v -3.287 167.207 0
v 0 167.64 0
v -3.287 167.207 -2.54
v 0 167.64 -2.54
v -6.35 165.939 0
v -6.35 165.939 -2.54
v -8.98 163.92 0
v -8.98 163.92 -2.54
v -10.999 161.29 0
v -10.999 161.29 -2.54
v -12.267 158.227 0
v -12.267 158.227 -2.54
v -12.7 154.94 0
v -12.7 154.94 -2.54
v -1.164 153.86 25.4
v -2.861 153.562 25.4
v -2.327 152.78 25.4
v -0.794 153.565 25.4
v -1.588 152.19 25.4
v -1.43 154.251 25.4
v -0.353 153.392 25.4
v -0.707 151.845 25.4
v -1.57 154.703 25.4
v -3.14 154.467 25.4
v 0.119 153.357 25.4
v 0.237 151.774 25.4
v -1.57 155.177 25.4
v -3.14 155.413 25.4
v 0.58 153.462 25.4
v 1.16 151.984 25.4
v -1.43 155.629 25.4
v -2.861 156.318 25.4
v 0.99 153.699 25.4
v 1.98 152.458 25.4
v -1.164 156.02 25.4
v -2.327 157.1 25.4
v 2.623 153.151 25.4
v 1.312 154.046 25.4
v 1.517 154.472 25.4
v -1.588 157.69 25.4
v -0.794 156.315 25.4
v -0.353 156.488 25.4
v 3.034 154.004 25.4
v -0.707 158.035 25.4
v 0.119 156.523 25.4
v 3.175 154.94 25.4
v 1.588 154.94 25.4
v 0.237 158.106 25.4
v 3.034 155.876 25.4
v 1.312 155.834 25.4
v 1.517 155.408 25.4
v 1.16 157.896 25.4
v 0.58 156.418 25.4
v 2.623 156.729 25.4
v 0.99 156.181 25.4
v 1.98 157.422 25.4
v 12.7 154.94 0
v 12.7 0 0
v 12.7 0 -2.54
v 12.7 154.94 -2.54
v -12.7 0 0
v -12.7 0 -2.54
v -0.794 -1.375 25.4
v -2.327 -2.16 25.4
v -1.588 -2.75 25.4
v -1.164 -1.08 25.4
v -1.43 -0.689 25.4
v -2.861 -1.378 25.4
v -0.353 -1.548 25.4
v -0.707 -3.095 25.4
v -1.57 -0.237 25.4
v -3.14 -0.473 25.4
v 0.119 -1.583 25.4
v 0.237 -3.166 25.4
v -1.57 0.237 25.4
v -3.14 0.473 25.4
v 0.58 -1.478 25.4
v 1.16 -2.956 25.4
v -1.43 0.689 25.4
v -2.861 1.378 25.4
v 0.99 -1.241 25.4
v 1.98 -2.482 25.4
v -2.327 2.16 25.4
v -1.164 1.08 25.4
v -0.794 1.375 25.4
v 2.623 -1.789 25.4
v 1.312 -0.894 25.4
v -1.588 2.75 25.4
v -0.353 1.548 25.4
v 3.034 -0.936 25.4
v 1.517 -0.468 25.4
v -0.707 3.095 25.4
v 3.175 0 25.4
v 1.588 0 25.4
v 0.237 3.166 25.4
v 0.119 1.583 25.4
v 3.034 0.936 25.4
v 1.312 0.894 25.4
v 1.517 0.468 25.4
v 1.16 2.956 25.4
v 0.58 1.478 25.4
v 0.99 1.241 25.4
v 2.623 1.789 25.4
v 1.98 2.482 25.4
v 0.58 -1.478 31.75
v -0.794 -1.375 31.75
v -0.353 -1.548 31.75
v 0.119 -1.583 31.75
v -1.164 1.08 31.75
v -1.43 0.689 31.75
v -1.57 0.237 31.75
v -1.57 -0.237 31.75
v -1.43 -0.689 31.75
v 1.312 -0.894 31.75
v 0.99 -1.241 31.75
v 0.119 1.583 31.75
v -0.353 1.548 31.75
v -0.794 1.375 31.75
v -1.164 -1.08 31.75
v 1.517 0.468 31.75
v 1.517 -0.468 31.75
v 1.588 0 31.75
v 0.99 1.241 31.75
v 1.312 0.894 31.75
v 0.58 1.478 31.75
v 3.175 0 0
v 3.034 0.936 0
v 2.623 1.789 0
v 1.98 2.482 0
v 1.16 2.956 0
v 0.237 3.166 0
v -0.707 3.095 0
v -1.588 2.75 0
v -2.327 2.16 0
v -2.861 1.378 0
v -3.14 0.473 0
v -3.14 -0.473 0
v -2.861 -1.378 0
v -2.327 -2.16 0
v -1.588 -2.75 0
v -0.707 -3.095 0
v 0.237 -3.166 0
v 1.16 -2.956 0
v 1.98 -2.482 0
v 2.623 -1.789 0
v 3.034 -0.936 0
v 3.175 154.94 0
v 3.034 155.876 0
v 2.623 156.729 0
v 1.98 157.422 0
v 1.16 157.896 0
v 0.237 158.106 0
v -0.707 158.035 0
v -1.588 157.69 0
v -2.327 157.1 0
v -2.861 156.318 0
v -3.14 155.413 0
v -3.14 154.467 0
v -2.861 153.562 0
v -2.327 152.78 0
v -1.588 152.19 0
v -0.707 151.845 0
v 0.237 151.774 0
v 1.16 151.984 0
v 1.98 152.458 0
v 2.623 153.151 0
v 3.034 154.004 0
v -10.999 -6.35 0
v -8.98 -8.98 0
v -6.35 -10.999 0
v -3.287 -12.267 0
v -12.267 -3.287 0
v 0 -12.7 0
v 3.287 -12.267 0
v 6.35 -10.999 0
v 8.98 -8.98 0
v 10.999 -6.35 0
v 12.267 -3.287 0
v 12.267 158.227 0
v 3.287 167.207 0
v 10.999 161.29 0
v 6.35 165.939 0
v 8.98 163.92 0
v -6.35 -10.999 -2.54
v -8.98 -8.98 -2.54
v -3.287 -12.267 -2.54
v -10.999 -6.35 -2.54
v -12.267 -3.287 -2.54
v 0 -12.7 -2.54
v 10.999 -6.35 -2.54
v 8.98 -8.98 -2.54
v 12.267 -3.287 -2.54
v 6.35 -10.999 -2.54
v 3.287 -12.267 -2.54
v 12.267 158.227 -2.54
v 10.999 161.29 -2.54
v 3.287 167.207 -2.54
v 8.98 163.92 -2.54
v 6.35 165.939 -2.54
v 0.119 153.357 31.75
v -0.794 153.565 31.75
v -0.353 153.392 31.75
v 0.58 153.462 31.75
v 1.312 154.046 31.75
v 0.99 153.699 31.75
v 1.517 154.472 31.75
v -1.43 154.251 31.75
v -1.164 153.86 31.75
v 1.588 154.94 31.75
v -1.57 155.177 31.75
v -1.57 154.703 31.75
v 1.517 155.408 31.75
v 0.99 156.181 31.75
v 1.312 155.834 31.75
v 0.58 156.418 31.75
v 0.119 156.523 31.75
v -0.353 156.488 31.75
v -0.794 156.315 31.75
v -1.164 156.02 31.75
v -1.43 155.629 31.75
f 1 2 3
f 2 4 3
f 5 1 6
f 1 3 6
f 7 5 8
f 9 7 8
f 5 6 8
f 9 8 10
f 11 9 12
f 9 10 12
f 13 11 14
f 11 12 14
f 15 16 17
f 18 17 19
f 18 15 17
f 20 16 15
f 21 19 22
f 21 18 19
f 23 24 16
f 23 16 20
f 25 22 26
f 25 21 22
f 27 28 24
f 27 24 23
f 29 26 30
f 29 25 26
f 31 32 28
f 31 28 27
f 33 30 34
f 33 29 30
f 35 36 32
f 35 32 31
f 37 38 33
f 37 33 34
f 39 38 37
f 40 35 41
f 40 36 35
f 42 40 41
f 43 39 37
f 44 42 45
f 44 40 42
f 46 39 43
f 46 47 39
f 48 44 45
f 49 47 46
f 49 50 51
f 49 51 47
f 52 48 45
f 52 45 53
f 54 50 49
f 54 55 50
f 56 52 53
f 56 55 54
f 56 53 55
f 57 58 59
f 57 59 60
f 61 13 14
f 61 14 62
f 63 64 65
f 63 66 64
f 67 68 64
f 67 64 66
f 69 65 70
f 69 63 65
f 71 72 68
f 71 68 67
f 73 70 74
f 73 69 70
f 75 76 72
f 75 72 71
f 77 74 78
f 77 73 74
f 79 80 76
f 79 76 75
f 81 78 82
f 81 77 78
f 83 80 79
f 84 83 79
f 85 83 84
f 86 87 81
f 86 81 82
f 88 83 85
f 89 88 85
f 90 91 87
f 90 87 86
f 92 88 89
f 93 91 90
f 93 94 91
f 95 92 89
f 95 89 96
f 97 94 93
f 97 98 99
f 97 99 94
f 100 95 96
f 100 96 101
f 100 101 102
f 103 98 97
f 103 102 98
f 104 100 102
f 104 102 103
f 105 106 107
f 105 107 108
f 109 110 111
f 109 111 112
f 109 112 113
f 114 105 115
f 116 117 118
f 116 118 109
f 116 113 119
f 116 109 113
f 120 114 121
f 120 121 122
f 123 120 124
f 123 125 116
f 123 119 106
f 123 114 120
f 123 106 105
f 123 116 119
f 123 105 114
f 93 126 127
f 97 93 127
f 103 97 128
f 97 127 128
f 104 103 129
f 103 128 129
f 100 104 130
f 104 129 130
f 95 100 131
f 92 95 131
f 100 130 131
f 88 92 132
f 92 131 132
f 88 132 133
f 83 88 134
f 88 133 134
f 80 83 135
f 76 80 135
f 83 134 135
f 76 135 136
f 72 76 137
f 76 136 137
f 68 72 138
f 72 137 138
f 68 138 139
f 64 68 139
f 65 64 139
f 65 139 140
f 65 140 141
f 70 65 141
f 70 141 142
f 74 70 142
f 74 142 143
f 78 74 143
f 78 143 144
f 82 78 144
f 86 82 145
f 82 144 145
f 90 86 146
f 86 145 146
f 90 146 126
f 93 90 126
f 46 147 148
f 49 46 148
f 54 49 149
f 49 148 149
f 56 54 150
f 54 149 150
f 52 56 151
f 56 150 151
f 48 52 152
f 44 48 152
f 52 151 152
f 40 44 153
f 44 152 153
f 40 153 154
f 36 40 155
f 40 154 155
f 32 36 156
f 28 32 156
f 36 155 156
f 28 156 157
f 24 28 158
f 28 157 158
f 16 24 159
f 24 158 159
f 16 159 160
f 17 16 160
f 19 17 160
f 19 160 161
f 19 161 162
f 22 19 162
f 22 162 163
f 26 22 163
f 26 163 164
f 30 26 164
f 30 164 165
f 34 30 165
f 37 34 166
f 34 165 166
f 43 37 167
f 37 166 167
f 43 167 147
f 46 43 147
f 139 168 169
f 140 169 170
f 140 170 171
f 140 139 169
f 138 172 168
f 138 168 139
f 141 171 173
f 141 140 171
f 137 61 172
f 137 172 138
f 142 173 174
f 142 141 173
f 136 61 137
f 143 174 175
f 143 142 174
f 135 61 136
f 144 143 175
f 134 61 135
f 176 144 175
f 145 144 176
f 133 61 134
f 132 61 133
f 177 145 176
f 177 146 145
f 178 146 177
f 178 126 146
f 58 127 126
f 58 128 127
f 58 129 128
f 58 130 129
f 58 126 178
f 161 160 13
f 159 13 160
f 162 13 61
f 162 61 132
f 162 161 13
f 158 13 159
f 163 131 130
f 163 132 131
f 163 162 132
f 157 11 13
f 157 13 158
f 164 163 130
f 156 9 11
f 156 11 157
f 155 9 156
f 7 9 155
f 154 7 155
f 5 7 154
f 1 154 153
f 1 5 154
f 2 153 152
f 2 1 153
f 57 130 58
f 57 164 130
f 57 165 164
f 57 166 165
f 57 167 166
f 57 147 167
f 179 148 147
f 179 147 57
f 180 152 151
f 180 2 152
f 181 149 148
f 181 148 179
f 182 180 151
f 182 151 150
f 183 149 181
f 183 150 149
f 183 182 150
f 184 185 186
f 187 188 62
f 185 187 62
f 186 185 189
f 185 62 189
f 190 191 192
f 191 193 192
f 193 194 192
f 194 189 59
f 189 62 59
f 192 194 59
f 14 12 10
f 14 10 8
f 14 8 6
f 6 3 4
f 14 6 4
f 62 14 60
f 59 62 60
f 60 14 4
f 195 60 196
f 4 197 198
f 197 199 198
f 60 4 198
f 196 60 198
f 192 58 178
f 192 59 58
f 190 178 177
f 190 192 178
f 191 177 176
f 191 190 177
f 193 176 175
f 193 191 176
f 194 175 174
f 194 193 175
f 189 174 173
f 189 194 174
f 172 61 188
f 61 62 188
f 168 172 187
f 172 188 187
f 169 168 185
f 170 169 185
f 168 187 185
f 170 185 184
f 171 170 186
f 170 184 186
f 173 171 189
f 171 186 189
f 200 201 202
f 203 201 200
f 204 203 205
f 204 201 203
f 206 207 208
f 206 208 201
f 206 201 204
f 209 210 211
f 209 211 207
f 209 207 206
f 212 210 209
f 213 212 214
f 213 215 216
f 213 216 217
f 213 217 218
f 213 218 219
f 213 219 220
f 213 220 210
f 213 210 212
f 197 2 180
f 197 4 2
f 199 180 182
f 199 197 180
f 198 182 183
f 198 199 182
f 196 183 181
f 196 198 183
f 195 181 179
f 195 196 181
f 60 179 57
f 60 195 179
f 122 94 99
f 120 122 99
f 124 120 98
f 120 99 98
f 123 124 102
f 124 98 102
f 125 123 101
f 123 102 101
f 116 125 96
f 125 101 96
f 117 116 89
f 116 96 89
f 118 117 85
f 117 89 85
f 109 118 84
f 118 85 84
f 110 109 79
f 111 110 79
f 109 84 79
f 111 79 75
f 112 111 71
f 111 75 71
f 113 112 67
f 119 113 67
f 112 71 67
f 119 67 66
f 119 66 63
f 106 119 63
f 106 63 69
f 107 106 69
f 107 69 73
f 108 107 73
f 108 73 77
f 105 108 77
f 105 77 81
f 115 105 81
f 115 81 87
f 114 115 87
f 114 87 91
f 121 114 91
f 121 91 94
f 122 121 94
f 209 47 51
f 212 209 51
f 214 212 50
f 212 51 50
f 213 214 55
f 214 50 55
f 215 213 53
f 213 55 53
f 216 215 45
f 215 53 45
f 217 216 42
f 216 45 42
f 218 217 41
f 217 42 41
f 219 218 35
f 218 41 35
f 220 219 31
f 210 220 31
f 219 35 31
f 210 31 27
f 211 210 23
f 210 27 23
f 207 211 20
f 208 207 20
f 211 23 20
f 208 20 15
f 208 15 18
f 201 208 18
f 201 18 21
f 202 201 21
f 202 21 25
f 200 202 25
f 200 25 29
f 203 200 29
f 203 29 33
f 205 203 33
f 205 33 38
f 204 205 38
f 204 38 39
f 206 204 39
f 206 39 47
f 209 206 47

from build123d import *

# Parameters (mm, degrees)
F0_R     = 3.175
F0_R_2   = 1.5875
F1_DEPTH = 2.54
F2_DEPTH = 25.4
F3_R     = 12.69999
F4_DEPTH = 31.75


# Not quite as in the source:
# - a fillet or chamfer is up to 0.001 mm smaller than in the source, because OpenCascade refuses the exact size


with BuildPart() as f1:
    # F0 (on Top) → F1 (new body)
    with BuildSketch(Plane.XY):
        Polygon((12.7, 167.64), (0, 167.64), (-12.7, 167.64), (-12.7, -12.7), (0, -12.7), (12.7, -12.7), align=None)
        Circle(F0_R, mode=Mode.SUBTRACT)
        with Locations((0, 154.94)):
            Circle(F0_R, mode=Mode.SUBTRACT)
        with Locations((0, 154.94)):
            Circle(F0_R)
        with Locations((0, 154.94)):
            Circle(F0_R_2, mode=Mode.SUBTRACT)
        with Locations((0, 154.94)):
            Circle(F0_R_2)
        Circle(F0_R)
        Circle(F0_R_2, mode=Mode.SUBTRACT)
        Circle(F0_R_2)
    extrude(amount=-F1_DEPTH)

    # F0 (on Top) → F2 (join)
    with BuildSketch(Plane.XY):
        with Locations((0, 154.94)):
            Circle(F0_R)
        with Locations((0, 154.94)):
            Circle(F0_R_2, mode=Mode.SUBTRACT)
        Circle(F0_R)
        Circle(F0_R_2, mode=Mode.SUBTRACT)
        with Locations((0, 154.94)):
            Circle(F0_R_2)
        Circle(F0_R_2)
    extrude(amount=F2_DEPTH)

    # F3 (radius 12.7 in the source; OpenCascade refuses exactly that, so slightly less here)
    f3_edges = [f1.edges().sort_by_distance(p)[0] for p in [
        (12.7, 167.64, -1.27),
        (-12.7, 167.64, -1.27),
        (-12.7, -12.7, -1.27),
        (12.7, -12.7, -1.27),
    ]]
    fillet(f3_edges, radius=F3_R)

    # F0 (on Top) → F4 (join)
    with BuildSketch(Plane.XY):
        Circle(F0_R_2)
        with Locations((0, 154.94)):
            Circle(F0_R_2)
    extrude(amount=F4_DEPTH)


solid = f1.part
